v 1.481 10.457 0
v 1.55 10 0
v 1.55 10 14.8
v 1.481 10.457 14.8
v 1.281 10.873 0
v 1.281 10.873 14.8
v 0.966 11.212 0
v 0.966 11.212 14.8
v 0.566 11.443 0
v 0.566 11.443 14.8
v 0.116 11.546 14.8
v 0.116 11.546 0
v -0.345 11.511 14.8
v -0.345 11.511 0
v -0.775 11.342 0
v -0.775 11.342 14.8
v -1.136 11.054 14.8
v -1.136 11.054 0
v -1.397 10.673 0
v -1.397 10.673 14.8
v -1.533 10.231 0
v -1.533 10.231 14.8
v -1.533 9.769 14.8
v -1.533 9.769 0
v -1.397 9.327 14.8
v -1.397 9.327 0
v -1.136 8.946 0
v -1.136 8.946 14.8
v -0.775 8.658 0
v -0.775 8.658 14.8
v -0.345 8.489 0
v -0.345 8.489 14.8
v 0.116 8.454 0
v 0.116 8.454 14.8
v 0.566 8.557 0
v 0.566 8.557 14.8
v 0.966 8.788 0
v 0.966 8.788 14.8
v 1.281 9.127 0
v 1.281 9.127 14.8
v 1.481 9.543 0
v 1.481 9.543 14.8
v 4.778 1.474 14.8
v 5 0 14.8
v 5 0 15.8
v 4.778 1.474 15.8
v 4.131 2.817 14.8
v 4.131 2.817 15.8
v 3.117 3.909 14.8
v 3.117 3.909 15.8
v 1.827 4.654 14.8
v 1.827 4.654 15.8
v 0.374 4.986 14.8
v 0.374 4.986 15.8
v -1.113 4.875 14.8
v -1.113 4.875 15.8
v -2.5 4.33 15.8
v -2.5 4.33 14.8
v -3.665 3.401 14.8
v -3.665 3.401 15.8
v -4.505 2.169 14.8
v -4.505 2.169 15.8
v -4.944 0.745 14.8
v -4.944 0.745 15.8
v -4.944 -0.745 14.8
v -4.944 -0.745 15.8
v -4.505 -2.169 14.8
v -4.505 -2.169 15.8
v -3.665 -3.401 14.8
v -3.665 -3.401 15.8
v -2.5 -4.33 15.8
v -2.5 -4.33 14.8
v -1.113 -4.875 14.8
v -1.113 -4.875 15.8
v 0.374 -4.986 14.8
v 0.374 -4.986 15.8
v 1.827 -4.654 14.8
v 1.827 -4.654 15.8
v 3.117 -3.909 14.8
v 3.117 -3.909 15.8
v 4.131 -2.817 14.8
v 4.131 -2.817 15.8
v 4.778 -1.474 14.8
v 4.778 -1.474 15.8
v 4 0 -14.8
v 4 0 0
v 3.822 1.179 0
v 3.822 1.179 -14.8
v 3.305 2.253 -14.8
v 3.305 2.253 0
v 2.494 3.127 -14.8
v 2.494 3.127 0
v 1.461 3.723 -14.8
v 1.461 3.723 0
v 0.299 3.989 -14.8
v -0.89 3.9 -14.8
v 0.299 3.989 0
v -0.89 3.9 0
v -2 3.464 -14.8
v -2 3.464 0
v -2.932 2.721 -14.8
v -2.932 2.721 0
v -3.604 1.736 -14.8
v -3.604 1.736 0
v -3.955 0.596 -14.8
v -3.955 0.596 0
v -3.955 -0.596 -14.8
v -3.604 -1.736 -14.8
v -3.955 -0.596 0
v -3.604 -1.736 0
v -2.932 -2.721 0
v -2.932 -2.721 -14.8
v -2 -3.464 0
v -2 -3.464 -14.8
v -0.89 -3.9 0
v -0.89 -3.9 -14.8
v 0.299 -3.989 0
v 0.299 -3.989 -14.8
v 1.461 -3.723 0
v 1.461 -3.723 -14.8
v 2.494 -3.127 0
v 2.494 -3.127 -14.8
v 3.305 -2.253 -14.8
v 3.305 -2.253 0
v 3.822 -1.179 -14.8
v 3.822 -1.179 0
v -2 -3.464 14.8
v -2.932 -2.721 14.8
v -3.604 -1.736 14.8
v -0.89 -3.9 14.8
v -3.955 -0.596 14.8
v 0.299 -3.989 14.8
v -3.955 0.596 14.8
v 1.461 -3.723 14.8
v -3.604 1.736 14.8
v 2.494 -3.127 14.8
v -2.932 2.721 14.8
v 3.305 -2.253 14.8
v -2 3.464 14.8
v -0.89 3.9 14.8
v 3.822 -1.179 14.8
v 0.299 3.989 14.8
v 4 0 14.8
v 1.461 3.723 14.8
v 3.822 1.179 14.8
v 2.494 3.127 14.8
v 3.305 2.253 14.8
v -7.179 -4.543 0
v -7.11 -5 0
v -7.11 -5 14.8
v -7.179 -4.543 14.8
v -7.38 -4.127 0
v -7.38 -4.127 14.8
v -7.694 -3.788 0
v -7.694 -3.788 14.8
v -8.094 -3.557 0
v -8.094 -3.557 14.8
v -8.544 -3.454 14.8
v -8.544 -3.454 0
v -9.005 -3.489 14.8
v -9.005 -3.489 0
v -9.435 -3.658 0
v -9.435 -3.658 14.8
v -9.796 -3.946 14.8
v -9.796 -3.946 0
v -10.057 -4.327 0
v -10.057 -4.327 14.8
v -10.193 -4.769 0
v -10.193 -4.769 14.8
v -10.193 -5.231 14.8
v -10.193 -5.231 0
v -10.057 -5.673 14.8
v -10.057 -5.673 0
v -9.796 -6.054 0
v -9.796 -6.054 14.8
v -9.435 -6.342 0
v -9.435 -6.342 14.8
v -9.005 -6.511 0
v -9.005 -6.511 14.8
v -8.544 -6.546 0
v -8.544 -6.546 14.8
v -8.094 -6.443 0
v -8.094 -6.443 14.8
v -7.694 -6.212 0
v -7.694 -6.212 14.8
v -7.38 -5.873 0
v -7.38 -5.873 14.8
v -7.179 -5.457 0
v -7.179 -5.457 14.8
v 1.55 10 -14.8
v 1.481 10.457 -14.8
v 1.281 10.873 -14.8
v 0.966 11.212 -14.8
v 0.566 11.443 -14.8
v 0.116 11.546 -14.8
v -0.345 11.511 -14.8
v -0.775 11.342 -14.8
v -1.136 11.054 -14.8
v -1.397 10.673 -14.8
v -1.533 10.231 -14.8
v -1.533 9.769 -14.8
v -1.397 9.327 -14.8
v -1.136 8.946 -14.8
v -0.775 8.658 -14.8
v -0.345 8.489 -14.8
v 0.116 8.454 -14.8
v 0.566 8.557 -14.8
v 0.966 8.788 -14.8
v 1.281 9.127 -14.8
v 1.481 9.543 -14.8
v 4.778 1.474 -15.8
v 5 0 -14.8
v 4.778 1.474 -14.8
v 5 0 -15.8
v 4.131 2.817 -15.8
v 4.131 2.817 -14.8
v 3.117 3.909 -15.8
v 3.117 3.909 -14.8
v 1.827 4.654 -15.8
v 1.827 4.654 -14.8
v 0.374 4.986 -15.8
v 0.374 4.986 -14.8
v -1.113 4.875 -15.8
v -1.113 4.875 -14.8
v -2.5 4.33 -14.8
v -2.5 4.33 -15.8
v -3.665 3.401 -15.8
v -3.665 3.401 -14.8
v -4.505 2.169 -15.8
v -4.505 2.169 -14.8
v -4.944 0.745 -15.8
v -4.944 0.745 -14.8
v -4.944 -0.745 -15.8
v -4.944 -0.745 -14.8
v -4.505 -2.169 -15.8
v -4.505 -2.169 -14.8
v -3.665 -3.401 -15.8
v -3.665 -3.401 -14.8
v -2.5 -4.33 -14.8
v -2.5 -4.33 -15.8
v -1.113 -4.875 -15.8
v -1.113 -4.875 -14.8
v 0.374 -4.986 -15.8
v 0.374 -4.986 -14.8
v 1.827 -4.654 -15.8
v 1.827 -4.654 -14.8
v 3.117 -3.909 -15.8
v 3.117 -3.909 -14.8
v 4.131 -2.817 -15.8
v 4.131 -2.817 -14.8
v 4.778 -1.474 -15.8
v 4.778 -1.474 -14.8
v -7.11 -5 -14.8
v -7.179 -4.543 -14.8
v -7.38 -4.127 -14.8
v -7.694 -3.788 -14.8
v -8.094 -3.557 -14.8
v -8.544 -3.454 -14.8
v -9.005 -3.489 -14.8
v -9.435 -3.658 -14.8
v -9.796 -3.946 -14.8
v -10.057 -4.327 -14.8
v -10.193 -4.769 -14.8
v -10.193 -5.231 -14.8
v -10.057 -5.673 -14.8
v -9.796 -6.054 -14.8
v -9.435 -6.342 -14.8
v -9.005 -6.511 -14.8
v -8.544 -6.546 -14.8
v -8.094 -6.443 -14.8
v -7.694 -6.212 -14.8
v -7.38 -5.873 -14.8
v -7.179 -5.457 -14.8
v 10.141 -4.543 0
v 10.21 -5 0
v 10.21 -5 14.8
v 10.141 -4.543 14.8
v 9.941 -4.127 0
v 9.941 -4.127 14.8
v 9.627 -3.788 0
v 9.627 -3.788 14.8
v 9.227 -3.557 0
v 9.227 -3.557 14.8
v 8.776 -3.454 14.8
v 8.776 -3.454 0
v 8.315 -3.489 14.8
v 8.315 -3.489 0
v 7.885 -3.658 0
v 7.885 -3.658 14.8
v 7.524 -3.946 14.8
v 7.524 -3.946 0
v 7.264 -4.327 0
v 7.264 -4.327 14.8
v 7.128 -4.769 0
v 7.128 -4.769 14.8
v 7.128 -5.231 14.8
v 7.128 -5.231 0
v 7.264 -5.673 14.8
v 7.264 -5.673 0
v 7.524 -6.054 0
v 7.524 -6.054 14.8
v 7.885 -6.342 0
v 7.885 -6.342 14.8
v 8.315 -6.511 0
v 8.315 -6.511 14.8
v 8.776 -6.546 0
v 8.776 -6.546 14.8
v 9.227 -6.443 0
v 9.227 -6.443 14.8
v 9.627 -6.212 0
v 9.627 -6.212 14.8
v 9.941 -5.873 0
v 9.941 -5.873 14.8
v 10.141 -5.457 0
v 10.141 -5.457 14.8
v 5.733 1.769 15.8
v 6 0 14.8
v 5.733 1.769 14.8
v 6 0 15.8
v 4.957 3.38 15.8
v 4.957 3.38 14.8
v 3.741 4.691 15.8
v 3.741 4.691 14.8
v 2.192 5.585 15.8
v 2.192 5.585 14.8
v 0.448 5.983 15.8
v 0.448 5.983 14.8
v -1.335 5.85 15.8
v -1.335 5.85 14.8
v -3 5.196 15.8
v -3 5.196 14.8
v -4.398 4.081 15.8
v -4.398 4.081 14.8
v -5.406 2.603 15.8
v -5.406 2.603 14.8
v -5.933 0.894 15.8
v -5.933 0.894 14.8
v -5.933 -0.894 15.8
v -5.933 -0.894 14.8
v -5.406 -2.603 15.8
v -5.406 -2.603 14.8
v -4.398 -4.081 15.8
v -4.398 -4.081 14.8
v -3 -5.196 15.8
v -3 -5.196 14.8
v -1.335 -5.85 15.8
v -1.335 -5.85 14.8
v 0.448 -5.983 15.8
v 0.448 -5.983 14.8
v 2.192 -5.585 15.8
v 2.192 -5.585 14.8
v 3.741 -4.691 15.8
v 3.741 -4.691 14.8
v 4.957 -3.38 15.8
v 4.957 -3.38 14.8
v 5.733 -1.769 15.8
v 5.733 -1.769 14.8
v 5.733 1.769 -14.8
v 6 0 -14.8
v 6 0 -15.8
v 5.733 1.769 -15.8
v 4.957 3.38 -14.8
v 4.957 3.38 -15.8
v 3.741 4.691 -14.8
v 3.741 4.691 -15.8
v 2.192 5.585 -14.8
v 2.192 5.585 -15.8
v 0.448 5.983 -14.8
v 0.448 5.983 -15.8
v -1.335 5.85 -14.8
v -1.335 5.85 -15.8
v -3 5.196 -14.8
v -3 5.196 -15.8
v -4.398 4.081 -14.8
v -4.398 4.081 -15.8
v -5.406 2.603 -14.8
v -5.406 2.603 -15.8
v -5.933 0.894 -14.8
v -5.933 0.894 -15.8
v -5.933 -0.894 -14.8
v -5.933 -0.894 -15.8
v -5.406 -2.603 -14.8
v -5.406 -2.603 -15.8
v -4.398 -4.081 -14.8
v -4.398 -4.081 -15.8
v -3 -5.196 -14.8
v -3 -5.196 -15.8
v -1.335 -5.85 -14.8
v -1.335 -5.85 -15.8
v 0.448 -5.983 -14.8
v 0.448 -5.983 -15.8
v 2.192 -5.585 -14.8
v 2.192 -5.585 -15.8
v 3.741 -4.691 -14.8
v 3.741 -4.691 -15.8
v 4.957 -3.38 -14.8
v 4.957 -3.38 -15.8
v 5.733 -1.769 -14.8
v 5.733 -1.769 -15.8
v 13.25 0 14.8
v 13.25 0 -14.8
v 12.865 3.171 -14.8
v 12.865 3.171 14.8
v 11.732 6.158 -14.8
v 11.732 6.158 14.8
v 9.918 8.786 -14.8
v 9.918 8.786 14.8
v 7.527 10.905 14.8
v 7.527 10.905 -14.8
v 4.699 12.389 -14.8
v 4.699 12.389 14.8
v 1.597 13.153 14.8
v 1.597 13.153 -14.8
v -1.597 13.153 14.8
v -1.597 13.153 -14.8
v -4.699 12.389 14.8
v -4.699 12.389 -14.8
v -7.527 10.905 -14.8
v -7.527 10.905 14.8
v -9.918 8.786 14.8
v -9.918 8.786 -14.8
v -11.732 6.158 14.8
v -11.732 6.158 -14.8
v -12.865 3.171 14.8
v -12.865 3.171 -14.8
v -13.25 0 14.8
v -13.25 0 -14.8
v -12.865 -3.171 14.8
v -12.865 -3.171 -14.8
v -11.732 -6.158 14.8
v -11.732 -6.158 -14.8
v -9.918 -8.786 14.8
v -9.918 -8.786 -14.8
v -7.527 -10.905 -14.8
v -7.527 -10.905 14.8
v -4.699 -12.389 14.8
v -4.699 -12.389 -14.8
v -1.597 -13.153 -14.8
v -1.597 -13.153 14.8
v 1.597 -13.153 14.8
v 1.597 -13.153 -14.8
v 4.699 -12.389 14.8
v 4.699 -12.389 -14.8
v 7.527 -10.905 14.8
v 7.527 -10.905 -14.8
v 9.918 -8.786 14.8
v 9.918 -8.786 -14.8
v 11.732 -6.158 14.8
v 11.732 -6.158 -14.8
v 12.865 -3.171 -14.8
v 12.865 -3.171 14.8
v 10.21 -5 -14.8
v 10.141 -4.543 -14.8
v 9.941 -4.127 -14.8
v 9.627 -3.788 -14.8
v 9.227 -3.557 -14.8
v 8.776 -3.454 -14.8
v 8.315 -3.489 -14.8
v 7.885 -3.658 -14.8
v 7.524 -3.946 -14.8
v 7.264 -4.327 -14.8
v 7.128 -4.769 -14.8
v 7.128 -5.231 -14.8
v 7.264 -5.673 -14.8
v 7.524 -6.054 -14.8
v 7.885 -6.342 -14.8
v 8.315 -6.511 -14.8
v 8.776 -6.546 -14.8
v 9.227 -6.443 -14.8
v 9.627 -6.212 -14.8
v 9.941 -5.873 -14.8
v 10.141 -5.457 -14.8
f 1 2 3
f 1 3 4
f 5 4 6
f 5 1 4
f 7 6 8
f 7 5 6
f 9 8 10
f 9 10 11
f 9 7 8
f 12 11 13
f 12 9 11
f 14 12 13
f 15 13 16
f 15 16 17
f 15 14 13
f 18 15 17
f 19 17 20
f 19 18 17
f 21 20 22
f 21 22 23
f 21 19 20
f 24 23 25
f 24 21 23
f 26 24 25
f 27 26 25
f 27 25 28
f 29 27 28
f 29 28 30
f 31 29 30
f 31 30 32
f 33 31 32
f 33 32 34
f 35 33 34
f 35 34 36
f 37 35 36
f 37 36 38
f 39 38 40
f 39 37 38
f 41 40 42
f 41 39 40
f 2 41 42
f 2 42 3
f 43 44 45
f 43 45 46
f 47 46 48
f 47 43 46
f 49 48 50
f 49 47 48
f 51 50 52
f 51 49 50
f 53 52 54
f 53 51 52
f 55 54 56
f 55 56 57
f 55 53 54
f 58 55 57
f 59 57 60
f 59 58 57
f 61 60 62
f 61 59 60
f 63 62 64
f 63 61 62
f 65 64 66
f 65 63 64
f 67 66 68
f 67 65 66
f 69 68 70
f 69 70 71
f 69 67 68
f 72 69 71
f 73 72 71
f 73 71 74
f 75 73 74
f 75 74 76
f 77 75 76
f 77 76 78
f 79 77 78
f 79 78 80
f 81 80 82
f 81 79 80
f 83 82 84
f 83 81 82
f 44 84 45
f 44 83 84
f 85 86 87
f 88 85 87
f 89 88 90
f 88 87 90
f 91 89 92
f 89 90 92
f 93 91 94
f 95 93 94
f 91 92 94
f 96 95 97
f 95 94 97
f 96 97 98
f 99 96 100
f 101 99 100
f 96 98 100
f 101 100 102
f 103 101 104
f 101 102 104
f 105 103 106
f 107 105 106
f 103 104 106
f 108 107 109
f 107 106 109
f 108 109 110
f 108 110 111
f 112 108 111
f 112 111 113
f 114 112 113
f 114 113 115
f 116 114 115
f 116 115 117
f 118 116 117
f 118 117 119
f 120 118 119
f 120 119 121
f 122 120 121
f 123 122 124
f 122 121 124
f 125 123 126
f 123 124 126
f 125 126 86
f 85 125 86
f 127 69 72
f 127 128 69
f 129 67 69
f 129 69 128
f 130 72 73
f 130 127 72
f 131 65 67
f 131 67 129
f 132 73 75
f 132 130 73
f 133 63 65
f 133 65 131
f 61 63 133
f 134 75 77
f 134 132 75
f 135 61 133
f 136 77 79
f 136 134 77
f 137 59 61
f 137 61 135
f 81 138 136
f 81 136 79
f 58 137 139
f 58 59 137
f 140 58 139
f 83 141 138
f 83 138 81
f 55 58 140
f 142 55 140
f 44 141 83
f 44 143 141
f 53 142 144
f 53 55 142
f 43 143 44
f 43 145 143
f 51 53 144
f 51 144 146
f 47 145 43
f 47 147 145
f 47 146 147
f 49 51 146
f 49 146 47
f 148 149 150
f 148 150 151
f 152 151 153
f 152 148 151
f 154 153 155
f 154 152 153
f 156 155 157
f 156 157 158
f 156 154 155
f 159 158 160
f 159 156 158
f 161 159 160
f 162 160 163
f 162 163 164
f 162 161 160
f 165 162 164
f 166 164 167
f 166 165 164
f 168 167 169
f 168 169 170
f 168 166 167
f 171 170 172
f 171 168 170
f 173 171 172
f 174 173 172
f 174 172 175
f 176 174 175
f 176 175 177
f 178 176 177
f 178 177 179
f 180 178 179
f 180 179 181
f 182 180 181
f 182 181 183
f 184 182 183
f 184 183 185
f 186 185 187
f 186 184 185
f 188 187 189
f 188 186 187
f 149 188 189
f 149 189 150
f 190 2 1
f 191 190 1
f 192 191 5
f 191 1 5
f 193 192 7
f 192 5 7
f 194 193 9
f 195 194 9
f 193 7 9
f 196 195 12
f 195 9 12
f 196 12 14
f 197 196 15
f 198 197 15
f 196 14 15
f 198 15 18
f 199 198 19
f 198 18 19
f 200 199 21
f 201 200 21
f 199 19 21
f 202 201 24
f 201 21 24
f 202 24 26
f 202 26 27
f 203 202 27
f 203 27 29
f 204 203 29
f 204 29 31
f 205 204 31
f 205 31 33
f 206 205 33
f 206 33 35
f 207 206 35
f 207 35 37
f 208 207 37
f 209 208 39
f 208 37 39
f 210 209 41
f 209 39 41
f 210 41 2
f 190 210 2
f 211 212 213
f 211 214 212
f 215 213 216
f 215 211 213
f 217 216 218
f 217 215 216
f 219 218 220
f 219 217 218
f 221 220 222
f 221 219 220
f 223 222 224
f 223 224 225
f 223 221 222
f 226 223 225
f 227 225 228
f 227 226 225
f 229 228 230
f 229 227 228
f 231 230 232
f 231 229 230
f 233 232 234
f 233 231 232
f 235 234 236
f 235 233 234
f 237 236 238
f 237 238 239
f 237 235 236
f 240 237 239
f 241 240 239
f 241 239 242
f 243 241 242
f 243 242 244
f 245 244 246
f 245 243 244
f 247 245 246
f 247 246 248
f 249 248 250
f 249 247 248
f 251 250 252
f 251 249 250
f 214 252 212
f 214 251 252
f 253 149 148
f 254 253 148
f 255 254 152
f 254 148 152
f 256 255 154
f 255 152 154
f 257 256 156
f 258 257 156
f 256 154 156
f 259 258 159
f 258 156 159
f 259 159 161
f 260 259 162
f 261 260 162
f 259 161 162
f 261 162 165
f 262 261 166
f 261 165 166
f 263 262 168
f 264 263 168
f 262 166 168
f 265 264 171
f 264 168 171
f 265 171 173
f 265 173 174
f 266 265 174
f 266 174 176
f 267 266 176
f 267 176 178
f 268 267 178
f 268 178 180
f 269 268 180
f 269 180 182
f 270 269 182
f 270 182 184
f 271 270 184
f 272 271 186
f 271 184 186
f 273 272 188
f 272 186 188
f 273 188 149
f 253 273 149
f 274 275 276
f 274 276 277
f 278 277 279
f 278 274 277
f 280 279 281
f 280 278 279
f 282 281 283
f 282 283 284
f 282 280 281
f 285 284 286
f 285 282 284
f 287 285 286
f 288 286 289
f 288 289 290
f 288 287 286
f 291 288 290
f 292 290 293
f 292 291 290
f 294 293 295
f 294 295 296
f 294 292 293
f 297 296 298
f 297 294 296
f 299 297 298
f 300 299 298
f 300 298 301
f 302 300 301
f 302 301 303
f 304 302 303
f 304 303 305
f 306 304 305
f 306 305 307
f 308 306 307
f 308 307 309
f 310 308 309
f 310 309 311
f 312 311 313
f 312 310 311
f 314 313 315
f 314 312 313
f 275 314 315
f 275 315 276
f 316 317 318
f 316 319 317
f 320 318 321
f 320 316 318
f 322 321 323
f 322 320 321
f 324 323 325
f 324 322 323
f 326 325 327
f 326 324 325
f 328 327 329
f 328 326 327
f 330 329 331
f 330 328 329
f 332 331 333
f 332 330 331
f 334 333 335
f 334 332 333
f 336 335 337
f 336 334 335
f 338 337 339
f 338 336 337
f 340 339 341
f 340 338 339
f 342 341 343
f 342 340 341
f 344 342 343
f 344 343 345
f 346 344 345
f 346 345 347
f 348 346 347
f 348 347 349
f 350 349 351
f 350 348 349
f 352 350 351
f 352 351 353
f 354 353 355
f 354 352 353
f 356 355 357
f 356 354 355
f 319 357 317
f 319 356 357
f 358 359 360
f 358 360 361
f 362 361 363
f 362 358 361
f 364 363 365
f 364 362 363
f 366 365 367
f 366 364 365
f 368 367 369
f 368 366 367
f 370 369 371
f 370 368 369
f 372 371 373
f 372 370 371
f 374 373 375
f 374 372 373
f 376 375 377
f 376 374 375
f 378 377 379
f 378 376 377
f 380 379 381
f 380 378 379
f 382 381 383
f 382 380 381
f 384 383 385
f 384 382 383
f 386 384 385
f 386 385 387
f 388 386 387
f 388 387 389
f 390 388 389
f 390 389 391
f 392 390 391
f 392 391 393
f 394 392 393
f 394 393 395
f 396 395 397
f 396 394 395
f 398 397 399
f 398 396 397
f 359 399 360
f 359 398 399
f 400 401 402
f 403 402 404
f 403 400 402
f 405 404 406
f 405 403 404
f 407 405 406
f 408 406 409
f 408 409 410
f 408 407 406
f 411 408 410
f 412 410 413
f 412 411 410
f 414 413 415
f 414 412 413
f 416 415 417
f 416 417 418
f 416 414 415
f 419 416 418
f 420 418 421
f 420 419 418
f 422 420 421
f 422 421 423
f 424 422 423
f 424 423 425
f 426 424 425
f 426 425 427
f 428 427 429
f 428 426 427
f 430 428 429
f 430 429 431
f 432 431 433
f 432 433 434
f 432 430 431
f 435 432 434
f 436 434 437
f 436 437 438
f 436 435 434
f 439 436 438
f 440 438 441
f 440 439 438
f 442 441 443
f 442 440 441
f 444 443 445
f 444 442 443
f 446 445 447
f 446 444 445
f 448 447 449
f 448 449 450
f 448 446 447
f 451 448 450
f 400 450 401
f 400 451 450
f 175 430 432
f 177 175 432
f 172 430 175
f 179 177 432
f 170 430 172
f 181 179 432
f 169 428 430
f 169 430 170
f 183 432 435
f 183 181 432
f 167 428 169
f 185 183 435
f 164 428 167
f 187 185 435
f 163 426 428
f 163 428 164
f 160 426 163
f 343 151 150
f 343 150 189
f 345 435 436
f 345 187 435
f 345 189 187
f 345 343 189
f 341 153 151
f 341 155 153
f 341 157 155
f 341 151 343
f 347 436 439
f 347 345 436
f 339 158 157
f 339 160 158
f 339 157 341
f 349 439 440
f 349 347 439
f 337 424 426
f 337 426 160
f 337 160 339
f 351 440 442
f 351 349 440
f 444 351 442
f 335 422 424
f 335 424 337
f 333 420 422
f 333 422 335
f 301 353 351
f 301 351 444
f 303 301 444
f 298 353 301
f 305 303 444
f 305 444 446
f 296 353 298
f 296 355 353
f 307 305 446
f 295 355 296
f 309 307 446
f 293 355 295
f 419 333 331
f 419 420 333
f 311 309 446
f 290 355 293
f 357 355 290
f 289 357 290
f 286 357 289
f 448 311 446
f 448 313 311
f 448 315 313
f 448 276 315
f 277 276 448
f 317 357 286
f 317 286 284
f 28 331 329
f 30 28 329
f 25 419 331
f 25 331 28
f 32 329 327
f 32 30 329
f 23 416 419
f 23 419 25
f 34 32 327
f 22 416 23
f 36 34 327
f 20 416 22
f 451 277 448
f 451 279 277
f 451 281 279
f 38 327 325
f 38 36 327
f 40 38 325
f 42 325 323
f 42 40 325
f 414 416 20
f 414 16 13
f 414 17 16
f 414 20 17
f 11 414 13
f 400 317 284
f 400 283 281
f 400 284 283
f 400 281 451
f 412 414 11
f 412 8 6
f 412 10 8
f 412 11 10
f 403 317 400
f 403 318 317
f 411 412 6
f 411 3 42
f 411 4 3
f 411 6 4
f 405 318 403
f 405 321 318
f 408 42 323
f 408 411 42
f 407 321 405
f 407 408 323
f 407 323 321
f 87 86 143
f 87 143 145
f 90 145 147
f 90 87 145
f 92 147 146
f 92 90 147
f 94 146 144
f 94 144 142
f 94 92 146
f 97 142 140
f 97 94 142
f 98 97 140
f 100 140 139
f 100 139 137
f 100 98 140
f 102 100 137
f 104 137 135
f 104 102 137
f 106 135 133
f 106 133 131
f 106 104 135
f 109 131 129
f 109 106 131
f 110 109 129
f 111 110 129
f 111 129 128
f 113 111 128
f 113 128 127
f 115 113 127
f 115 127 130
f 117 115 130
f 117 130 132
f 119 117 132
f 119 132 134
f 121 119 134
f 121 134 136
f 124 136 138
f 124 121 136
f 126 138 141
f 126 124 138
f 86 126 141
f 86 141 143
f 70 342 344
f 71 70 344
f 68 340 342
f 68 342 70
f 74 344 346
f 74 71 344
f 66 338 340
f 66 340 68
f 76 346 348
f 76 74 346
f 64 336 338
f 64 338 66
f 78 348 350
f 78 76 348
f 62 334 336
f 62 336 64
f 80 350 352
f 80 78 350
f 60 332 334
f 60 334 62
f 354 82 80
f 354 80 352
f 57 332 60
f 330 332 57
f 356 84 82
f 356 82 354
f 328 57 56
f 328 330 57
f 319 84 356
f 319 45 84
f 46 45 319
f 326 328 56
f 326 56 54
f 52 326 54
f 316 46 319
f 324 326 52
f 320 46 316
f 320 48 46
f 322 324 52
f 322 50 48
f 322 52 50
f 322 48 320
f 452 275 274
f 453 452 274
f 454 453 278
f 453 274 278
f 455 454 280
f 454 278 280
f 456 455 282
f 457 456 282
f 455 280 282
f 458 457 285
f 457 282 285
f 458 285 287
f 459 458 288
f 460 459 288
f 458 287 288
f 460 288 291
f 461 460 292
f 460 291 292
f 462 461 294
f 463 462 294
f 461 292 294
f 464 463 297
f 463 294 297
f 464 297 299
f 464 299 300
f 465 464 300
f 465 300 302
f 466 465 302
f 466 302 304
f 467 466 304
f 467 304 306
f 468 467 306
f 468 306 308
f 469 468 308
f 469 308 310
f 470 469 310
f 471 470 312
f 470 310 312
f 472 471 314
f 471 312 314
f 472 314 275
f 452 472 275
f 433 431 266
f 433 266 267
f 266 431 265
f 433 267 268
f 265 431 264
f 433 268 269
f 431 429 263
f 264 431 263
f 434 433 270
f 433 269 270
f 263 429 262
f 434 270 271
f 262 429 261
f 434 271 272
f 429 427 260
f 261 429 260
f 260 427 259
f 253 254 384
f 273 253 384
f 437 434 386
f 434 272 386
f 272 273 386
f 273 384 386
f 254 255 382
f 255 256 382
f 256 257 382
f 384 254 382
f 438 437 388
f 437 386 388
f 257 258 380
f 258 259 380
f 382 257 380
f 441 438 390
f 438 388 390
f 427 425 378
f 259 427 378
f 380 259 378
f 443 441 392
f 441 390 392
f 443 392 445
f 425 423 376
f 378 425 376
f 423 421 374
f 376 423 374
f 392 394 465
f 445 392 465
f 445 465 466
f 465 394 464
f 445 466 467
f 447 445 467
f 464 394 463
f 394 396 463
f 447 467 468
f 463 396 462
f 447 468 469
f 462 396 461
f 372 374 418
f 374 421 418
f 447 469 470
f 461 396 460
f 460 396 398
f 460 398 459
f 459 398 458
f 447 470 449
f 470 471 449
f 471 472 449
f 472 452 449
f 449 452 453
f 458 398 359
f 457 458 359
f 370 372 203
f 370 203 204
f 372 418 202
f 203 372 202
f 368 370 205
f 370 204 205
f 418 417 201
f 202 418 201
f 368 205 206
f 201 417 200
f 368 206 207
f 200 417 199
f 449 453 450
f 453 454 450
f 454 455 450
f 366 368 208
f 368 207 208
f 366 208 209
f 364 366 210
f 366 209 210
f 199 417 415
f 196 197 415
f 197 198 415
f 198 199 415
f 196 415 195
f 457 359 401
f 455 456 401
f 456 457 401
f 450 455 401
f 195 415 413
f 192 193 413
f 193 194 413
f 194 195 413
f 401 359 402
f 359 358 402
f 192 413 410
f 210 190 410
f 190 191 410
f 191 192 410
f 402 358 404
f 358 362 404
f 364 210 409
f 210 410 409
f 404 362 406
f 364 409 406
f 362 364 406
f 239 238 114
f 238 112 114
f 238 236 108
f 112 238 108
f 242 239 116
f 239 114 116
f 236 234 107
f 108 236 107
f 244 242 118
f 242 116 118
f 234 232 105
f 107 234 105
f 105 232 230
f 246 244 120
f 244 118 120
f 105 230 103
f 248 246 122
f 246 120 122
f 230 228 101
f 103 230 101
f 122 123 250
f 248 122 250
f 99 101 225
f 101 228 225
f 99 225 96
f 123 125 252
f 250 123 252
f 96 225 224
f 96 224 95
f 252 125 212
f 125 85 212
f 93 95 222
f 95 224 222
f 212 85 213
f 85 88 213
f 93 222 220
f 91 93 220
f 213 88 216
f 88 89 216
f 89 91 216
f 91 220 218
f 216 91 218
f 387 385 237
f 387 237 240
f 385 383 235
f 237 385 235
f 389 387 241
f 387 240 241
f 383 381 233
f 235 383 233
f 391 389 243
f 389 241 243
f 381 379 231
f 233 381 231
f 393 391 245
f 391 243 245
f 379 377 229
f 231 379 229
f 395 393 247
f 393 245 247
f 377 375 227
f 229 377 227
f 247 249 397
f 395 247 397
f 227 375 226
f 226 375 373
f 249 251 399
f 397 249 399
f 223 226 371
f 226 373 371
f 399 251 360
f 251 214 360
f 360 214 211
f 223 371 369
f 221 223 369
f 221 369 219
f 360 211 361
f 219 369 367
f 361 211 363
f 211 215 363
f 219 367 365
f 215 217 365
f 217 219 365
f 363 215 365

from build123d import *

# Parameters (mm, degrees)
SKETCH1_R           = 13.25
SKETCH1_R_2         = 1.55
SKETCH1_R_3         = 4
BOSS_EXTRUDE1_DEPTH = 14.8
SKETCH1_3_R         = 6
SKETCH1_3_R_2       = 5
EXTRUDE_THIN1_DEPTH = 15.8


with BuildPart() as part:
    # Sketch1 → Boss-Extrude1 (new, symmetric)
    with BuildSketch(Plane.XY):
        Circle(SKETCH1_R)
        with Locations((-8.660254038, -5)):
            Circle(SKETCH1_R_2, mode=Mode.SUBTRACT)
        with Locations((8.660254038, -5)):
            Circle(SKETCH1_R_2, mode=Mode.SUBTRACT)
        with Locations((0, 10)):
            Circle(SKETCH1_R_2, mode=Mode.SUBTRACT)
        Circle(SKETCH1_R_3, mode=Mode.SUBTRACT)
    extrude(amount=BOSS_EXTRUDE1_DEPTH, both=True)

    # Sketch1<3> → Extrude-Thin1 (add, symmetric)
    with BuildSketch(Plane.XY):
        Circle(SKETCH1_3_R)
        Circle(SKETCH1_3_R_2, mode=Mode.SUBTRACT)
    extrude(amount=EXTRUDE_THIN1_DEPTH, both=True)


solid = part.part
